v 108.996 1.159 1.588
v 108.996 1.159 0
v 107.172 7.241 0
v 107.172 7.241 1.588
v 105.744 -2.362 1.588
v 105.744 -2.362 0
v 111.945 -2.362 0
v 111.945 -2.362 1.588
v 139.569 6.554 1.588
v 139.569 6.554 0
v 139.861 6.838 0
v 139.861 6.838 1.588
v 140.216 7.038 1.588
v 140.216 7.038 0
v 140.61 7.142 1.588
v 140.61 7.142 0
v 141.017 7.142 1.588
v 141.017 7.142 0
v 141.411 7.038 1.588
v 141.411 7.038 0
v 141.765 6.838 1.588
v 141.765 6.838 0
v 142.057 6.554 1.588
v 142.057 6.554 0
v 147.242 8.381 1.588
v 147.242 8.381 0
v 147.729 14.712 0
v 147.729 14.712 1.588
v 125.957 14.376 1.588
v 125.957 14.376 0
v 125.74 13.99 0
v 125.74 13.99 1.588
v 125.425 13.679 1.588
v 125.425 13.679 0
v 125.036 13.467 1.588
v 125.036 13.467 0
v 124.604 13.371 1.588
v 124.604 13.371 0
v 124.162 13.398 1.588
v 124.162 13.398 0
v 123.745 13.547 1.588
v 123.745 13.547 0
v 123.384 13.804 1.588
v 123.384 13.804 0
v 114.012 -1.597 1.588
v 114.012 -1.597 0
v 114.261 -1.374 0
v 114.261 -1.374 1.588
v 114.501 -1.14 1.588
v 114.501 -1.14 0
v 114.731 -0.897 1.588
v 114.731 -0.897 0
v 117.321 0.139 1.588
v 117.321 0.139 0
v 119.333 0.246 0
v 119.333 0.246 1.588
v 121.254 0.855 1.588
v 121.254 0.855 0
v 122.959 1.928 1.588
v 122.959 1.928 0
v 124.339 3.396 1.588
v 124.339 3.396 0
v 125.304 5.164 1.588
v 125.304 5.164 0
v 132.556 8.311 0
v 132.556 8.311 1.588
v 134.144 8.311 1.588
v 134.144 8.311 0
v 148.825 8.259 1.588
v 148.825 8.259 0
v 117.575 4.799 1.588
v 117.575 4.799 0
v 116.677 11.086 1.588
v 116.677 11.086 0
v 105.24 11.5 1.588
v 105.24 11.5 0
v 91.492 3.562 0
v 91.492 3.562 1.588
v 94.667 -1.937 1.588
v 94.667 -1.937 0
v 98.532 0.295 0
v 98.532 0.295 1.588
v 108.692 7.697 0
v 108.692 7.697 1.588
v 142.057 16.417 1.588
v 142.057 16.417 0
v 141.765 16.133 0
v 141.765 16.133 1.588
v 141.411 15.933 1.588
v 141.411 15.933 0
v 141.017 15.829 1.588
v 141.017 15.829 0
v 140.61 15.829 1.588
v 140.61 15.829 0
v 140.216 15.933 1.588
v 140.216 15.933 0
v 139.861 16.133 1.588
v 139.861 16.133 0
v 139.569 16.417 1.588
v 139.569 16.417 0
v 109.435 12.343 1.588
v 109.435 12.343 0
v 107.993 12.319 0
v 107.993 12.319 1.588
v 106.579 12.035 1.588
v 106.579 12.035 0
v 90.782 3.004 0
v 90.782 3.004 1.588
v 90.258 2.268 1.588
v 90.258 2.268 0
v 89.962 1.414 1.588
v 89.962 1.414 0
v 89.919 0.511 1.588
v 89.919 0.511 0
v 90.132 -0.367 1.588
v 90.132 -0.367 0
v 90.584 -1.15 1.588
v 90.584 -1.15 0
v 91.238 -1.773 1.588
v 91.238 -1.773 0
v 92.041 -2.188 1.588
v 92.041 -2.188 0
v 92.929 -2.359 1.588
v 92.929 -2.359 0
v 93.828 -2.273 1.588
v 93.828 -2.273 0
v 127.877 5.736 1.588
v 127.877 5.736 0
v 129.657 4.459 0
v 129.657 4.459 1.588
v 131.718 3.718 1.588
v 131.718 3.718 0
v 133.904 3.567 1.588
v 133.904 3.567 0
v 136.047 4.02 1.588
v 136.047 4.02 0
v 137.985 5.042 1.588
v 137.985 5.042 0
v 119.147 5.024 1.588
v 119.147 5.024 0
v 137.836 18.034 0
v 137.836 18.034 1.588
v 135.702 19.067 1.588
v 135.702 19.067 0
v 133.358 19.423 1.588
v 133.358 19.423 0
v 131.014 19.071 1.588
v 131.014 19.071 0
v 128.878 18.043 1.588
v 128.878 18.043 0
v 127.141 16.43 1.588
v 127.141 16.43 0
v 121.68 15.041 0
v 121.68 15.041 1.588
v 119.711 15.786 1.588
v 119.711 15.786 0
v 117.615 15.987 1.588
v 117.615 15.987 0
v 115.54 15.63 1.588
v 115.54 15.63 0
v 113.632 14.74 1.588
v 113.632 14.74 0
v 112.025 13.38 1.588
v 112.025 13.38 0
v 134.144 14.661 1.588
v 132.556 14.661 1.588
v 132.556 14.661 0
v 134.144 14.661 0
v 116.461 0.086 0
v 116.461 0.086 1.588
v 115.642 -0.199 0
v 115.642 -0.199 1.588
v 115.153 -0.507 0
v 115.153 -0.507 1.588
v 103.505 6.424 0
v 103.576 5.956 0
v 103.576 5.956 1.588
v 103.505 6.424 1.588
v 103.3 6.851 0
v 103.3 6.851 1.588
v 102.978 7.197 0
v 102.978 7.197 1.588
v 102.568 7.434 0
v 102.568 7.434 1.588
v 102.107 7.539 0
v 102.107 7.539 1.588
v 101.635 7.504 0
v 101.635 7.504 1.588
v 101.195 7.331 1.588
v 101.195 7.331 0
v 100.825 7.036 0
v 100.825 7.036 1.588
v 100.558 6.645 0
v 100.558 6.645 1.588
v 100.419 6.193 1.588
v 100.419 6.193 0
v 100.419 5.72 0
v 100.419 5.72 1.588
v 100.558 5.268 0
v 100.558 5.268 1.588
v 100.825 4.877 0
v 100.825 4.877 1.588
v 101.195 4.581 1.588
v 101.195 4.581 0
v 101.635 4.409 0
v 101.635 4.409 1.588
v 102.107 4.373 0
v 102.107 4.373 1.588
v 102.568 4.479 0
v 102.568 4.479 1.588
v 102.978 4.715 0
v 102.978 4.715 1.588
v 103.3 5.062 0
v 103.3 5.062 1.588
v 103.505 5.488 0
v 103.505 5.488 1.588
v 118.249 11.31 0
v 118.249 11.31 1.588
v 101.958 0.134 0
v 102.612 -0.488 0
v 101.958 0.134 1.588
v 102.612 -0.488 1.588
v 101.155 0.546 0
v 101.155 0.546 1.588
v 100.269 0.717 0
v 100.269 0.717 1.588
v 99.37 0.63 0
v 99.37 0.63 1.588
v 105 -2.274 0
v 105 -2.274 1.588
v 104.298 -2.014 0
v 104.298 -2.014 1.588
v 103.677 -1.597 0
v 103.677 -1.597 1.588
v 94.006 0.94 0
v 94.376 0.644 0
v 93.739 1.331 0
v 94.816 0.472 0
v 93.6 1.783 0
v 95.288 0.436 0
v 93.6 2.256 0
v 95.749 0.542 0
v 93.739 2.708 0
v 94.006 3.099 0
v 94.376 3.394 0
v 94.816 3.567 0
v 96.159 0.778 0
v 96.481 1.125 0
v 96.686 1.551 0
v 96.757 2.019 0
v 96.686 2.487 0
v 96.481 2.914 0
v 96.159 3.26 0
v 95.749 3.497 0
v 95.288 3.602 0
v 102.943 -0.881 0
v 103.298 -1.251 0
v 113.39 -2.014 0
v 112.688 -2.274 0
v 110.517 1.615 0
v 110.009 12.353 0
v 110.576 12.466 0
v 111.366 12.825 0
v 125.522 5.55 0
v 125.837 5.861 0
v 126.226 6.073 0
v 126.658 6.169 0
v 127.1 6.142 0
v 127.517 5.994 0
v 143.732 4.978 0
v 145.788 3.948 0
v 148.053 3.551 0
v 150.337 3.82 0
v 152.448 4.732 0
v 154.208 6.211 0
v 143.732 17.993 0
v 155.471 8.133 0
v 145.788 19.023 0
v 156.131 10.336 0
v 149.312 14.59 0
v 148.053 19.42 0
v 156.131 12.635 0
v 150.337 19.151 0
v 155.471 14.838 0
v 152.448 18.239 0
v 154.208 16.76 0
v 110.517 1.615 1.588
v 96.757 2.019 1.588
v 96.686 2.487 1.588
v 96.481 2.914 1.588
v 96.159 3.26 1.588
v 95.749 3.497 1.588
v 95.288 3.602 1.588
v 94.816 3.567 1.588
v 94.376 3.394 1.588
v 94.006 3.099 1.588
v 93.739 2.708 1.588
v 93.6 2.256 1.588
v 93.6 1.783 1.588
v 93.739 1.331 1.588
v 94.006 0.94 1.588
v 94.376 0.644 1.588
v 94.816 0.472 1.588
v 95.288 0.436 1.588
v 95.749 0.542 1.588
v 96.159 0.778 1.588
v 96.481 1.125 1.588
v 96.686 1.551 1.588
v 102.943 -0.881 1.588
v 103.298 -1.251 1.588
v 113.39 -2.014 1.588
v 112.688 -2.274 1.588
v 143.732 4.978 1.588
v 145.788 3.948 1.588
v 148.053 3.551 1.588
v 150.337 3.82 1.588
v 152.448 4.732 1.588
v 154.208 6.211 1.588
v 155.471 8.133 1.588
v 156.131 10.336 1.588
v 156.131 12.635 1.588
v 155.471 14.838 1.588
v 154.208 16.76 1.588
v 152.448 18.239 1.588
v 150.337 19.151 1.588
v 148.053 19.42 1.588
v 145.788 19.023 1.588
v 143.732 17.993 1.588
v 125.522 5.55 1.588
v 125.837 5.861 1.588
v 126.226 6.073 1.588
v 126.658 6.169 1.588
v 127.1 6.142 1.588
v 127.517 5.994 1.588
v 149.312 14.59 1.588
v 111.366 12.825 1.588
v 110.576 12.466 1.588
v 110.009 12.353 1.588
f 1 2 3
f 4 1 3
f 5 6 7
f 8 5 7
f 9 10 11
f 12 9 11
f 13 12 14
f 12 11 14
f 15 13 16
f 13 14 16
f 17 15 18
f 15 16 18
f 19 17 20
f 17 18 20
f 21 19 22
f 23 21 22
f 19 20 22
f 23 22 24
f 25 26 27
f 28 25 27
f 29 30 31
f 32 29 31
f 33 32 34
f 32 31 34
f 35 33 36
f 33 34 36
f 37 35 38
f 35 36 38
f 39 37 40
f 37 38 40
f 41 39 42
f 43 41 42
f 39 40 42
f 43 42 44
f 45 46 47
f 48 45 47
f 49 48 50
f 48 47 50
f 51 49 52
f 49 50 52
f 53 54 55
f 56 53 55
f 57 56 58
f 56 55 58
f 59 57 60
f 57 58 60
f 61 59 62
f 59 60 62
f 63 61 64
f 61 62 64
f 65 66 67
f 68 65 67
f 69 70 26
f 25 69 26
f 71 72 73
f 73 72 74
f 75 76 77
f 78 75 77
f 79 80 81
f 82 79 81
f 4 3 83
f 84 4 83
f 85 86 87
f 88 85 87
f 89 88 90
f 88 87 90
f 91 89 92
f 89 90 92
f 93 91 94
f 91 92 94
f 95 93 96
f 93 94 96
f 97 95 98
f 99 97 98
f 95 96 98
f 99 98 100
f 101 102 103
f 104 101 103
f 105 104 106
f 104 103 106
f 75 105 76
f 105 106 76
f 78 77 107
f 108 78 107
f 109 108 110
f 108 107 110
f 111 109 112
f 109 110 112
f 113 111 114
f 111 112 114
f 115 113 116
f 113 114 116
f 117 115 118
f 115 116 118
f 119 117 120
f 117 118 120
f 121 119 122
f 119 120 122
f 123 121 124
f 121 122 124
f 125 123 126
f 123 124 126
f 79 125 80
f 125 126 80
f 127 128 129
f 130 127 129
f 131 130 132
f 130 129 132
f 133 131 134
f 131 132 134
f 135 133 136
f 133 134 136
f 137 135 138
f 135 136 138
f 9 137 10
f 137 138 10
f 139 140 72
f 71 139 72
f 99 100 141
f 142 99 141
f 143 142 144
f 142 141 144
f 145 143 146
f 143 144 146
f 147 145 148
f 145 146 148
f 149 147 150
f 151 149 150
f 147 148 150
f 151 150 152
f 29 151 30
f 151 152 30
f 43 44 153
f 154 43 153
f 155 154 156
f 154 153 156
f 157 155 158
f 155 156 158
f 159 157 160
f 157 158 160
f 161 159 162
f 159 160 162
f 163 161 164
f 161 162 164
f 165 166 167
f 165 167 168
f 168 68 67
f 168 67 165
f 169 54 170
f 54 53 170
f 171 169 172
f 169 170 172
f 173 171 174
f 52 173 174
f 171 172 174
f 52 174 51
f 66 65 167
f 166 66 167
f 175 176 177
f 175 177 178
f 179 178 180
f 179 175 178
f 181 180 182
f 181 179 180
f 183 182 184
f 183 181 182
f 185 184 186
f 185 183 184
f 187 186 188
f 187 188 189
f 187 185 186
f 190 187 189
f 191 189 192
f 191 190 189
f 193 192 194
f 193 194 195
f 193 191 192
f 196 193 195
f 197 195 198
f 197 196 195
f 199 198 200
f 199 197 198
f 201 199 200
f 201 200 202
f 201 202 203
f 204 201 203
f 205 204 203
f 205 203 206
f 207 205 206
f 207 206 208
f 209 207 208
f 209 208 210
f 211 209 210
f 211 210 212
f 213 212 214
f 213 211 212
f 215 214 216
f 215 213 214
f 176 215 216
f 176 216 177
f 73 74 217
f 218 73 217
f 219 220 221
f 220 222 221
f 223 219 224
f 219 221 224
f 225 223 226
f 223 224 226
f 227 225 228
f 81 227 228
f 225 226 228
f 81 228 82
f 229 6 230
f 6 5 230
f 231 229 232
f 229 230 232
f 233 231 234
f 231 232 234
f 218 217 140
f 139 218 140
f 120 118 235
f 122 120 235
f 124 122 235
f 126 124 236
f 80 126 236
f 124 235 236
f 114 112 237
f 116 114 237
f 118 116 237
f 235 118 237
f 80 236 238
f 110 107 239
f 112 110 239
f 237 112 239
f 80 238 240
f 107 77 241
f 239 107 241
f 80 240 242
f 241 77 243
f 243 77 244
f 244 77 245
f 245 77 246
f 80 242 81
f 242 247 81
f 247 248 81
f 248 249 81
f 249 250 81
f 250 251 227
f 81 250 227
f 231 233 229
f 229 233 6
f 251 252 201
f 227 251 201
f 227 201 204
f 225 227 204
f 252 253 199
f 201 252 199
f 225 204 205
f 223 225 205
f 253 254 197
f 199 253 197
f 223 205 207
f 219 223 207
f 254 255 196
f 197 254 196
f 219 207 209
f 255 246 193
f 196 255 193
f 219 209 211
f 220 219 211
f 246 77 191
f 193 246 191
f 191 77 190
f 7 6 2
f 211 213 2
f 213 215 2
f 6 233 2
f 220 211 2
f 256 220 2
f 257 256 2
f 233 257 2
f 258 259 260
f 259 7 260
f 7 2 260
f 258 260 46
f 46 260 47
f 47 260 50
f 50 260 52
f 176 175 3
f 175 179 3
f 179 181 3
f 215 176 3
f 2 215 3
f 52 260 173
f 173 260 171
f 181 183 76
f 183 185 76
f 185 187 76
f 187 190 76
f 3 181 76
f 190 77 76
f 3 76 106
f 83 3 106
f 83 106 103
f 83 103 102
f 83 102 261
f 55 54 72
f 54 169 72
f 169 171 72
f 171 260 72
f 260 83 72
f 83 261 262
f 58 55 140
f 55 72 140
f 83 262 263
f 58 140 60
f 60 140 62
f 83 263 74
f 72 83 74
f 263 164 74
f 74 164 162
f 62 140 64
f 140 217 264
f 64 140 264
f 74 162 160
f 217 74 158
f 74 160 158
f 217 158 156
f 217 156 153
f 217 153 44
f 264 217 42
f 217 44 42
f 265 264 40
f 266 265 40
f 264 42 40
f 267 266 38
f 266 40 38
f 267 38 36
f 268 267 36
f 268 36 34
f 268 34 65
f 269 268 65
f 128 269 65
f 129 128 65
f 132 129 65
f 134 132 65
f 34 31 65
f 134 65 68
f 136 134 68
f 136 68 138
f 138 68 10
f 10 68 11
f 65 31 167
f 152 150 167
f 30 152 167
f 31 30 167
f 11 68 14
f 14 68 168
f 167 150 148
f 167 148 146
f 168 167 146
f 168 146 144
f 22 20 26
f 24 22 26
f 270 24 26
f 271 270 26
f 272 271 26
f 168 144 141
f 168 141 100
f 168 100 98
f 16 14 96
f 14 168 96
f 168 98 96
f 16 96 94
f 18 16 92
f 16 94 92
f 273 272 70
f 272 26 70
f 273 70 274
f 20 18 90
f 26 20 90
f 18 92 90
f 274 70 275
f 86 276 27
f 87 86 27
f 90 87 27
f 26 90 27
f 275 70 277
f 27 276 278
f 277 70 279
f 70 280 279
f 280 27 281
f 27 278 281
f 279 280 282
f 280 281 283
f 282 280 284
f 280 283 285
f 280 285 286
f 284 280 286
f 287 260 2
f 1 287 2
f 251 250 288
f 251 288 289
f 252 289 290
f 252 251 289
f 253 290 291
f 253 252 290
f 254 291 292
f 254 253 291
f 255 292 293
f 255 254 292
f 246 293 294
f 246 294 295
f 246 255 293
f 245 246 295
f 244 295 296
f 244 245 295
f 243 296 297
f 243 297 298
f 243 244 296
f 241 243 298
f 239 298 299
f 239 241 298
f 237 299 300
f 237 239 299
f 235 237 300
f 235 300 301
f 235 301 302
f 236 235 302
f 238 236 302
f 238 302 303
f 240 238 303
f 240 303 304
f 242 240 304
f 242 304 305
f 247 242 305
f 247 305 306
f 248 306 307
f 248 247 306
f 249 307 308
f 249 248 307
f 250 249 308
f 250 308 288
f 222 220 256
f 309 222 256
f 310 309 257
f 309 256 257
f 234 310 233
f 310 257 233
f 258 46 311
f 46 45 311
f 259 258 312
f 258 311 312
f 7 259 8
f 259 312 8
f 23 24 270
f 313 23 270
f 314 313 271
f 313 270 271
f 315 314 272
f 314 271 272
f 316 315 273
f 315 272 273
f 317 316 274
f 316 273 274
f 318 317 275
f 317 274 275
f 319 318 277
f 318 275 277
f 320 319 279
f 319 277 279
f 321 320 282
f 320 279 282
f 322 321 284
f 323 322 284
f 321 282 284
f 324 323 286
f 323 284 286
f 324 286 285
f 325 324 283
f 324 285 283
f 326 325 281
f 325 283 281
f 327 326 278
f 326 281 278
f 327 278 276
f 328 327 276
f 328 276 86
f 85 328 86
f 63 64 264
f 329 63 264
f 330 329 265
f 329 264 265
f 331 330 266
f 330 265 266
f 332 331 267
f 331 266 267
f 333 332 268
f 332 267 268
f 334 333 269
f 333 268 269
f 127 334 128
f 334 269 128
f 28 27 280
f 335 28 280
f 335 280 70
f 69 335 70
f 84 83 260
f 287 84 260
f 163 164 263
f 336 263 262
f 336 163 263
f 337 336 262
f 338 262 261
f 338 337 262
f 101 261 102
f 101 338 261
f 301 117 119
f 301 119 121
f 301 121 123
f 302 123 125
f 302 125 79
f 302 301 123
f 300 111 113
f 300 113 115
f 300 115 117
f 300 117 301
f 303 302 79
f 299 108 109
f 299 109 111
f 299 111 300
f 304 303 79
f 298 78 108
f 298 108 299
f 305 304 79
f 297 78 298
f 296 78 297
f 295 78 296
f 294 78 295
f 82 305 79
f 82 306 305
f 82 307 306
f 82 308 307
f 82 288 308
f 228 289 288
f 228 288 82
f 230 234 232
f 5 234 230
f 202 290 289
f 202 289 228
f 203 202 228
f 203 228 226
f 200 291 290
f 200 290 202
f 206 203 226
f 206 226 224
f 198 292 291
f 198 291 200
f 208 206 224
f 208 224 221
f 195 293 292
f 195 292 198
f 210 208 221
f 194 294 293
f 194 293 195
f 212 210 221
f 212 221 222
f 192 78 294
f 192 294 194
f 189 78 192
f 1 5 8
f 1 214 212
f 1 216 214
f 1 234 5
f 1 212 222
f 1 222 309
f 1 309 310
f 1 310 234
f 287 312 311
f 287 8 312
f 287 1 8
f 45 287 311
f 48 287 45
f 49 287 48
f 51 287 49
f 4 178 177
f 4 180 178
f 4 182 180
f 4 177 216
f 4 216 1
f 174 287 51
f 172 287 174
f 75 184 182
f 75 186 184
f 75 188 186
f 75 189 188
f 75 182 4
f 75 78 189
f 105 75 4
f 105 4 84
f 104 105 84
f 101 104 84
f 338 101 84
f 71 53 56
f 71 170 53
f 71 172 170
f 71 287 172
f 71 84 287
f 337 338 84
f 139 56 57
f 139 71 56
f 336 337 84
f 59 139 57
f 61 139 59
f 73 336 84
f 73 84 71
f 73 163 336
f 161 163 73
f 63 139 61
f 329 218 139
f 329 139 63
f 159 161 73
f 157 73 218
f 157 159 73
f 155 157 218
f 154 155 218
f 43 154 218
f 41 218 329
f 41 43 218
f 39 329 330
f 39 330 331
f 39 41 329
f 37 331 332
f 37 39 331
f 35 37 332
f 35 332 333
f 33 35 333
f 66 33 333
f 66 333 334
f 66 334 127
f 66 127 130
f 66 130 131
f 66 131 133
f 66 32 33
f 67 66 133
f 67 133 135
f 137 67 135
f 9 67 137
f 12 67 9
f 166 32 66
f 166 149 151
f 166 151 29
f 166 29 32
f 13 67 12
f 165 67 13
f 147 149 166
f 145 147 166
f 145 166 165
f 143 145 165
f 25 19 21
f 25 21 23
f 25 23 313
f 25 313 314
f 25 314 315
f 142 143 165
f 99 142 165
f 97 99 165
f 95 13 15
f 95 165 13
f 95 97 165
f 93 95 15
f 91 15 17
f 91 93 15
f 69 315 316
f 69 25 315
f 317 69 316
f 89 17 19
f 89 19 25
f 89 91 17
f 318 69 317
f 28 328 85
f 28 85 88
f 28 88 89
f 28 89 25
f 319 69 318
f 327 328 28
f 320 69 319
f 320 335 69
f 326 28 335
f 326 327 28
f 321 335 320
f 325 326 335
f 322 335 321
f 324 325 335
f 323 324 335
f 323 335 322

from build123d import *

# Parameters (mm, degrees)
BOSS_EXTRUDE1_OUTLINE_R = 1.5875
BOSS_EXTRUDE1_OUTLINE_W = 1.5875
BOSS_EXTRUDE1_OUTLINE_H = 6.35
BOSS_EXTRUDE1_DEPTH     = 1.5875
FILLET1_R               = 3.175


# Read off the part's stored shape, not the designer's step: Boss-Extrude1
with BuildPart() as part:
    # Boss-Extrude1 outline → Boss-Extrude1 (new body)
    with BuildSketch(Plane.XY):
        with BuildLine():
            ThreePointArc((142.057282468, 6.553787305), (156.214269946, 11.485509293), (142.057282468, 16.417231281))
            ThreePointArc((142.057282468, 16.417231281), (140.813384973, 15.816075679), (139.569487477, 16.417231281))
            ThreePointArc((139.569487477, 16.417231281), (132.172803886, 19.335230024), (125.957459481, 14.375881403))
            ThreePointArc((125.957459481, 14.375881403), (124.82332848, 13.404258866), (123.384428498, 13.804096739))
            ThreePointArc((123.384428498, 13.804096739), (116.794815058, 15.913313858), (111.053922915, 12.051454261))
            ThreePointArc((111.053922915, 12.051454261), (108.094534878, 12.329767665), (105.240273774, 11.499930657))
            Line((105.240273774, 11.499930657), (91.492120489, 3.562430657))
            ThreePointArc((91.492120489, 3.562430657), (90.329989832, -0.7747), (94.667120489, -1.936830657))
            Line((94.667120489, -1.936830657), (101.318750253, 1.903489577))
            ThreePointArc((101.318750253, 1.903489577), (102.647339692, -0.532407494), (104.733149805, -2.3622))
            Line((104.733149805, -2.3622), (112.955202512, -2.3622))
            ThreePointArc((112.955202512, -2.3622), (114.503673459, -1.137682555), (115.702067342, 0.431093193))
            ThreePointArc((115.702067342, 0.431093193), (121.421294864, 0.935289323), (125.304354616, 5.164429205))
            ThreePointArc((125.304354616, 5.164429205), (126.438485618, 6.136051741), (127.8773856, 5.736213868))
            ThreePointArc((127.8773856, 5.736213868), (133.903679898, 3.567343797), (139.569487477, 6.553787305))
            ThreePointArc((139.569487477, 6.553787305), (140.813384973, 7.154942907), (142.057282468, 6.553787305))
        make_face()
        with Locations((95.169339789, 2.0193)):
            Circle(BOSS_EXTRUDE1_OUTLINE_R, mode=Mode.SUBTRACT)
        with Locations((101.988423818, 5.9563)):
            Circle(BOSS_EXTRUDE1_OUTLINE_R, mode=Mode.SUBTRACT)
        Polygon((110.516780309, 1.614730068), (108.996231081, 1.158565299), (107.171572008, 7.24076221), (108.692121236, 7.696926979), align=None, mode=Mode.SUBTRACT)
        Polygon((118.248573702, 11.310144159), (119.146599315, 5.023964874), (117.575054493, 4.799458471), (116.677028881, 11.085637756), align=None, mode=Mode.SUBTRACT)
        with Locations((133.35, 11.485509293)):
            Rectangle(BOSS_EXTRUDE1_OUTLINE_W, BOSS_EXTRUDE1_OUTLINE_H, mode=Mode.SUBTRACT)
        Polygon((149.311693327, 14.590279439), (148.82467056, 8.258983456), (147.241846564, 8.380739148), (147.728869332, 14.71203513), align=None, mode=Mode.SUBTRACT)
    extrude(amount=BOSS_EXTRUDE1_DEPTH)

    # Fillet1
    fillet1_edges = [part.edges().sort_by_distance(p)[0] for p in [
        (115.702067342, 0.431093193, 0.79375),
        (112.955202512, -2.3622, 0.79375),
        (104.733149805, -2.3622, 0.79375),
        (101.318750253, 1.903489577, 0.79375),
        (111.053922915, 12.051454261, 0.79375),
    ]]
    fillet(fillet1_edges, radius=FILLET1_R)


solid = part.part
